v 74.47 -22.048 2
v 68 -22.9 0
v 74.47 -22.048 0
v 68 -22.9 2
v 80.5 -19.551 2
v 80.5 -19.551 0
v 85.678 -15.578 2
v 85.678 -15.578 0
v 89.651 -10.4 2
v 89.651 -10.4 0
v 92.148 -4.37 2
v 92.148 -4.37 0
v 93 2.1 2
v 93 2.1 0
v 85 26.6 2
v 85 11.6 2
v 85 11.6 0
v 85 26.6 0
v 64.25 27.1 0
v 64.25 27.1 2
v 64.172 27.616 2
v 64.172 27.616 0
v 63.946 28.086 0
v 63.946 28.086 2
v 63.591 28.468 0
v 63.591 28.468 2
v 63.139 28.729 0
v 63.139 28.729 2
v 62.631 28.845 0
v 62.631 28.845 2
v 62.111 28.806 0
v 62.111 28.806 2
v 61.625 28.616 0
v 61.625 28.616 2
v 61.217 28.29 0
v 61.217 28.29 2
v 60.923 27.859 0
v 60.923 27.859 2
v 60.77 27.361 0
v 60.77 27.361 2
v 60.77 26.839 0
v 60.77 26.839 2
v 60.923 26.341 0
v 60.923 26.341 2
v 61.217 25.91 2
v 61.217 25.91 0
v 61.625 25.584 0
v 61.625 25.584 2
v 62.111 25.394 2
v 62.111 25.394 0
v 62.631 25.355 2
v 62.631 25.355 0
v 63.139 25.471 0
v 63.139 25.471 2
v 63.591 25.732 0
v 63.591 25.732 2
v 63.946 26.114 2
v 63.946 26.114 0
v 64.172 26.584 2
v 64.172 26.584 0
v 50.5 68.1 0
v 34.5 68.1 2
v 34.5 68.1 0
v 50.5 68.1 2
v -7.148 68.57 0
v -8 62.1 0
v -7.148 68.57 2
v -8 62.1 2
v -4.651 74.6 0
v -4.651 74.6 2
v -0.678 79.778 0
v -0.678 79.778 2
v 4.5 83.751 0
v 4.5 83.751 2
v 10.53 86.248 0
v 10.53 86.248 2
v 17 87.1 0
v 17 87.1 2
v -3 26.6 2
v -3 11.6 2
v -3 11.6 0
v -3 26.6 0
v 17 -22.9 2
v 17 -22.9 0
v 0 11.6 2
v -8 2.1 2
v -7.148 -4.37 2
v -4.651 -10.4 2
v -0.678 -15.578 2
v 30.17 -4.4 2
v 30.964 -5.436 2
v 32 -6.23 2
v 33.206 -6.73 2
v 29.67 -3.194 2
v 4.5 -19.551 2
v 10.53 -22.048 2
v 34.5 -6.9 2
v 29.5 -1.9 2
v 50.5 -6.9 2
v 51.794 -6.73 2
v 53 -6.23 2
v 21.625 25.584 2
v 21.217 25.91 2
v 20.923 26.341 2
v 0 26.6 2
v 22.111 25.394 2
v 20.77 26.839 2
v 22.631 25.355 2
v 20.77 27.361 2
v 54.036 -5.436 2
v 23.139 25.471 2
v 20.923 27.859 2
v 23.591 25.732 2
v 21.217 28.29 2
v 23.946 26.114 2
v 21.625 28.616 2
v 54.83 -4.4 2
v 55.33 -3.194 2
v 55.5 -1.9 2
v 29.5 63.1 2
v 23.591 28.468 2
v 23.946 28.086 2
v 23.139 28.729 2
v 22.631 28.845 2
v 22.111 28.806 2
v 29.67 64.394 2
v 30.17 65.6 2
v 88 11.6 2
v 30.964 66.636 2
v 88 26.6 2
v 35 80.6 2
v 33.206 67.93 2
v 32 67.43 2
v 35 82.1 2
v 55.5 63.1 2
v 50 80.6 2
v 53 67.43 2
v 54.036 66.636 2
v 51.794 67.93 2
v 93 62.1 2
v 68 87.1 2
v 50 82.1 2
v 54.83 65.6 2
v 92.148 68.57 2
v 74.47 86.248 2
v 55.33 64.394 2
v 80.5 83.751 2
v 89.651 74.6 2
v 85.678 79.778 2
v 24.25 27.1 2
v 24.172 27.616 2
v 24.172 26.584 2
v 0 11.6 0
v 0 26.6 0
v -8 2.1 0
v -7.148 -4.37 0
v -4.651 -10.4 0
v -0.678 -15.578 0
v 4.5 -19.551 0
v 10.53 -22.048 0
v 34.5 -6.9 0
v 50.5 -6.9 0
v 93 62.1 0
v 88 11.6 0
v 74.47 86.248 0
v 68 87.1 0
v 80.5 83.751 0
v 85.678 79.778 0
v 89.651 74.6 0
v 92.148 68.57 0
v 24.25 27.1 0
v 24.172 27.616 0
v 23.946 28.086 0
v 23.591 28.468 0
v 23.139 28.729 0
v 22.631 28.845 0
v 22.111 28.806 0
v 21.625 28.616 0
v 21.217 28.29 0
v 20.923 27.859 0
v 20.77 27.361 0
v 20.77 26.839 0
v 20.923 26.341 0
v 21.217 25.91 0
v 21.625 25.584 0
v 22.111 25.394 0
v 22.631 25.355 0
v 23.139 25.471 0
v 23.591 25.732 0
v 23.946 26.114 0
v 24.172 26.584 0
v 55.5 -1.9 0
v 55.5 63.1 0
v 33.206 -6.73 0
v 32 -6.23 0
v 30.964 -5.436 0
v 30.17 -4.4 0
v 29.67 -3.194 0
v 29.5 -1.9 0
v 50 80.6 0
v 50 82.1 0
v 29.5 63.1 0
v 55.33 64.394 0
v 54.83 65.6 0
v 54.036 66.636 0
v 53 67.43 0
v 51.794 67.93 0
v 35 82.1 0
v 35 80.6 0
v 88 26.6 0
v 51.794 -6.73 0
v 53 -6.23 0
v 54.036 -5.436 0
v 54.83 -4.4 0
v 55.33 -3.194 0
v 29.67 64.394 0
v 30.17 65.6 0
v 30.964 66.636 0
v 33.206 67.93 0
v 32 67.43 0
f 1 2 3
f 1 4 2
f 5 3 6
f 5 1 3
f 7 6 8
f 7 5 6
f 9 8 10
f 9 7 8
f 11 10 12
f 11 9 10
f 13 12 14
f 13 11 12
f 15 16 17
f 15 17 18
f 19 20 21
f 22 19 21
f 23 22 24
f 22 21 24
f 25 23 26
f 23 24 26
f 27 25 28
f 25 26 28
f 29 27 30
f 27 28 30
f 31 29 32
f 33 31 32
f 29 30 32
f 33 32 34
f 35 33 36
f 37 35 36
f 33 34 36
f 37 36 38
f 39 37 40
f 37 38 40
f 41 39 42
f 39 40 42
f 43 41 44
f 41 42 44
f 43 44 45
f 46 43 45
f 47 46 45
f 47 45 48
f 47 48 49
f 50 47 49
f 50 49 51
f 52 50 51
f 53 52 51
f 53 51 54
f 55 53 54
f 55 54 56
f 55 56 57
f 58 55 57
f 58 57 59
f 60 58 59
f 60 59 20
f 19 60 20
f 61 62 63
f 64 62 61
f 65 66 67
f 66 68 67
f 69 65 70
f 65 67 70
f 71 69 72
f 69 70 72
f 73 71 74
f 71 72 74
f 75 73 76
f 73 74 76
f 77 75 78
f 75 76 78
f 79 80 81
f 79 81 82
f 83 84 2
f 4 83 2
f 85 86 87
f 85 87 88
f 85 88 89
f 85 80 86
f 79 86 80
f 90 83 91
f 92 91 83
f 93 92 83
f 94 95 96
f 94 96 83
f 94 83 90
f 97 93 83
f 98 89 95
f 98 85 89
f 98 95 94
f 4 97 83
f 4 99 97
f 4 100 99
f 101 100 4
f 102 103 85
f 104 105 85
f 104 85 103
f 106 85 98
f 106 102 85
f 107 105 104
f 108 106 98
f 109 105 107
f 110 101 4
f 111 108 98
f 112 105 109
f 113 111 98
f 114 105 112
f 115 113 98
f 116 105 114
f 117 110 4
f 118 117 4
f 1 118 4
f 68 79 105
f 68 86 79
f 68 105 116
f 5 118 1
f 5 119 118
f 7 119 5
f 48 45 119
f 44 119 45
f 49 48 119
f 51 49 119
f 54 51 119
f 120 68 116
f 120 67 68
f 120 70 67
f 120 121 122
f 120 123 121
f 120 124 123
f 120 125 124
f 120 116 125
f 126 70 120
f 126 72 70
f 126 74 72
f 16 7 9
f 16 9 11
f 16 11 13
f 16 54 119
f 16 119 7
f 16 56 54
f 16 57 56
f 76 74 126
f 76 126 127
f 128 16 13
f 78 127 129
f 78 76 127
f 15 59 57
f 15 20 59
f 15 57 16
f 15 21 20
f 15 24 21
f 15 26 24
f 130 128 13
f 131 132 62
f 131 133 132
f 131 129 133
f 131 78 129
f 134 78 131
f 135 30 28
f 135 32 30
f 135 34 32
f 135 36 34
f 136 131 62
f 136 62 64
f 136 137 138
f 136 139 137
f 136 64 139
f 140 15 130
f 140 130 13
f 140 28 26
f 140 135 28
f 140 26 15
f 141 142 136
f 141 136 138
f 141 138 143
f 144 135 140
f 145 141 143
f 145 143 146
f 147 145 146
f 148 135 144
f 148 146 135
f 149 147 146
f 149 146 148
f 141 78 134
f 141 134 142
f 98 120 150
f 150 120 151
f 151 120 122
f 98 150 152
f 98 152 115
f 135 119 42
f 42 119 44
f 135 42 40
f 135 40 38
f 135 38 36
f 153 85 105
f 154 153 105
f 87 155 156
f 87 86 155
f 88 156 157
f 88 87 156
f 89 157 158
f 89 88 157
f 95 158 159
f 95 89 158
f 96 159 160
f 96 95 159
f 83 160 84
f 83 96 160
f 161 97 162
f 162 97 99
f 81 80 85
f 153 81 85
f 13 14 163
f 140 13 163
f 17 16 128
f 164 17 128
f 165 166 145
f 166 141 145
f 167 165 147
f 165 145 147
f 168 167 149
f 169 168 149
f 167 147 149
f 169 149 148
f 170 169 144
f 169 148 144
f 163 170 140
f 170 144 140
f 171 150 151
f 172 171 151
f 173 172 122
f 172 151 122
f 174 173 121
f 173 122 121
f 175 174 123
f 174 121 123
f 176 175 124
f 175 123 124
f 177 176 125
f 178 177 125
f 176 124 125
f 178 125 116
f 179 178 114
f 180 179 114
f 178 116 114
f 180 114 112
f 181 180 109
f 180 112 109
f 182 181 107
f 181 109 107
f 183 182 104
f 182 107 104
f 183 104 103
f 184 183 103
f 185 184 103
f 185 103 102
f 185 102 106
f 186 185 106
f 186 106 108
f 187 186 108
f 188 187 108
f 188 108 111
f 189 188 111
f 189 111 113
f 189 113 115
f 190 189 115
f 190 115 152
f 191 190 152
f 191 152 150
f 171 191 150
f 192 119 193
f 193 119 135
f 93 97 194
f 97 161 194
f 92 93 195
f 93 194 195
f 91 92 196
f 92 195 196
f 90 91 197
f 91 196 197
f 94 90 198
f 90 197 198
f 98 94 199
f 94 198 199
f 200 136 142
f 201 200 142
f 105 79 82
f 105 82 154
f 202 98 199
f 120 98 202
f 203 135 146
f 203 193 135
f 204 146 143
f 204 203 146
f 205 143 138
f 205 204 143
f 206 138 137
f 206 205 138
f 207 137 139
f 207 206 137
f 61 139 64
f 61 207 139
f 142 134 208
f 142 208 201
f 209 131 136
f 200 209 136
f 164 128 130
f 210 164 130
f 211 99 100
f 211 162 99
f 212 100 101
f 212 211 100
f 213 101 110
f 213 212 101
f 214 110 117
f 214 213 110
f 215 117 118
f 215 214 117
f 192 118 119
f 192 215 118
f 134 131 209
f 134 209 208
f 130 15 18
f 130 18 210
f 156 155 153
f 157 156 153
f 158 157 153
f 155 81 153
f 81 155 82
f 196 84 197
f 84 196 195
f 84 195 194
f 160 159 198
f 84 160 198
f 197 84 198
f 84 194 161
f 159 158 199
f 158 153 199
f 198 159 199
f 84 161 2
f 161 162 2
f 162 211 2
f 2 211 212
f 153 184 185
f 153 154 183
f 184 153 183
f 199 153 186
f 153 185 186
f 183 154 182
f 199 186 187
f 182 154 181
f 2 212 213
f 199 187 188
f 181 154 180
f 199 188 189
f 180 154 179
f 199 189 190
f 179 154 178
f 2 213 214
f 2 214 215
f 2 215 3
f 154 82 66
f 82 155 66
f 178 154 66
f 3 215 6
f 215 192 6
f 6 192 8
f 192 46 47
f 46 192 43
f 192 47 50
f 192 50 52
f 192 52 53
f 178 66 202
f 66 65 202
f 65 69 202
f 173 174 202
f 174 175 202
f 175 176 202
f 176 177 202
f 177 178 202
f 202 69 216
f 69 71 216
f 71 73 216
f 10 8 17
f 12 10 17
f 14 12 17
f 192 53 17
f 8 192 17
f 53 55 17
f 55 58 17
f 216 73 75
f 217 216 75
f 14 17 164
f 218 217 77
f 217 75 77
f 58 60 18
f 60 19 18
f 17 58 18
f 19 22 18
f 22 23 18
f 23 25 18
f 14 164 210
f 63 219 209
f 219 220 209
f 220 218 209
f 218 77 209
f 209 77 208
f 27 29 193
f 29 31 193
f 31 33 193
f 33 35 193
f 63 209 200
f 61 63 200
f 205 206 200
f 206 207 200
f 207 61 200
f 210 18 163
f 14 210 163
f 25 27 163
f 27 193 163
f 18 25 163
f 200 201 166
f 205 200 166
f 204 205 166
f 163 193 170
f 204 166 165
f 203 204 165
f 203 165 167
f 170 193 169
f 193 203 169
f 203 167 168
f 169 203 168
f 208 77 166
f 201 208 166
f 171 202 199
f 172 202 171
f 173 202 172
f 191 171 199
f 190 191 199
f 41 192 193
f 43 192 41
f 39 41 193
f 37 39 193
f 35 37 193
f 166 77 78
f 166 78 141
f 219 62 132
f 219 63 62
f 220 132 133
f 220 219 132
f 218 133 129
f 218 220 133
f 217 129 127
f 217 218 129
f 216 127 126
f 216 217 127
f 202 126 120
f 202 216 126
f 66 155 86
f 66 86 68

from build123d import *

# Parameters (mm, degrees)
SKETCH1_W           = 101
SKETCH1_H           = 110
BOSS_EXTRUDE1_DEPTH = 2
SKETCH3_W           = 15
SKETCH3_H           = 1.5
SKETCH3_W_2         = 3
SKETCH3_H_2         = 15
CUT_EXTRUDE1_DEPTH  = 128.433943673
FILLET2_R           = 25
SKETCH9_W           = 26
SKETCH9_H           = 75
CUT_EXTRUDE2_DEPTH  = 128.433943673
FILLET3_R           = 5
SKETCH4_R           = 1.75
CUT_EXTRUDE3_DEPTH  = 10


with BuildPart() as part:
    # Sketch1 → Boss-Extrude1 (new body)
    with BuildSketch(Plane.XY):
        with Locations((42.5, 32.1)):
            Rectangle(SKETCH1_W, SKETCH1_H)
    extrude(amount=BOSS_EXTRUDE1_DEPTH)

    # Sketch3 → Cut-Extrude1 (cut, through all)
    with BuildSketch(Plane.XY.offset(2)):
        with Locations((42.5, 81.35)):
            Rectangle(SKETCH3_W, SKETCH3_H)
        with Locations((-1.5, 19.1)):
            Rectangle(SKETCH3_W_2, SKETCH3_H_2)
        with Locations((86.5, 19.1)):
            Rectangle(SKETCH3_W_2, SKETCH3_H_2)
    extrude(amount=-CUT_EXTRUDE1_DEPTH, mode=Mode.SUBTRACT)

    # Fillet2
    fillet2_edges = [part.edges().sort_by_distance(p)[0] for p in [
        (-8, 87.1, 1),
        (93, 87.1, 1),
        (93, -22.9, 1),
        (-8, -22.9, 1),
    ]]
    fillet(fillet2_edges, radius=FILLET2_R)

    # Sketch9 → Cut-Extrude2 (cut, through all)
    with BuildSketch(Plane.XY.offset(2)):
        with Locations((42.5, 30.6)):
            Rectangle(SKETCH9_W, SKETCH9_H)
    extrude(amount=-CUT_EXTRUDE2_DEPTH, mode=Mode.SUBTRACT)

    # Fillet3
    fillet3_edges = [part.edges().sort_by_distance(p)[0] for p in [
        (29.5, -6.9, 1),
        (29.5, 68.1, 1),
        (55.5, 68.1, 1),
        (55.5, -6.9, 1),
    ]]
    fillet(fillet3_edges, radius=FILLET3_R)

    # Sketch4 → Cut-Extrude3 (cut)
    with BuildSketch(Plane.XY.offset(2)):
        with Locations((22.5, 27.1)):
            Circle(SKETCH4_R)
        with Locations((62.5, 27.1)):
            Circle(SKETCH4_R)
    extrude(amount=-CUT_EXTRUDE3_DEPTH, mode=Mode.SUBTRACT)


solid = part.part
